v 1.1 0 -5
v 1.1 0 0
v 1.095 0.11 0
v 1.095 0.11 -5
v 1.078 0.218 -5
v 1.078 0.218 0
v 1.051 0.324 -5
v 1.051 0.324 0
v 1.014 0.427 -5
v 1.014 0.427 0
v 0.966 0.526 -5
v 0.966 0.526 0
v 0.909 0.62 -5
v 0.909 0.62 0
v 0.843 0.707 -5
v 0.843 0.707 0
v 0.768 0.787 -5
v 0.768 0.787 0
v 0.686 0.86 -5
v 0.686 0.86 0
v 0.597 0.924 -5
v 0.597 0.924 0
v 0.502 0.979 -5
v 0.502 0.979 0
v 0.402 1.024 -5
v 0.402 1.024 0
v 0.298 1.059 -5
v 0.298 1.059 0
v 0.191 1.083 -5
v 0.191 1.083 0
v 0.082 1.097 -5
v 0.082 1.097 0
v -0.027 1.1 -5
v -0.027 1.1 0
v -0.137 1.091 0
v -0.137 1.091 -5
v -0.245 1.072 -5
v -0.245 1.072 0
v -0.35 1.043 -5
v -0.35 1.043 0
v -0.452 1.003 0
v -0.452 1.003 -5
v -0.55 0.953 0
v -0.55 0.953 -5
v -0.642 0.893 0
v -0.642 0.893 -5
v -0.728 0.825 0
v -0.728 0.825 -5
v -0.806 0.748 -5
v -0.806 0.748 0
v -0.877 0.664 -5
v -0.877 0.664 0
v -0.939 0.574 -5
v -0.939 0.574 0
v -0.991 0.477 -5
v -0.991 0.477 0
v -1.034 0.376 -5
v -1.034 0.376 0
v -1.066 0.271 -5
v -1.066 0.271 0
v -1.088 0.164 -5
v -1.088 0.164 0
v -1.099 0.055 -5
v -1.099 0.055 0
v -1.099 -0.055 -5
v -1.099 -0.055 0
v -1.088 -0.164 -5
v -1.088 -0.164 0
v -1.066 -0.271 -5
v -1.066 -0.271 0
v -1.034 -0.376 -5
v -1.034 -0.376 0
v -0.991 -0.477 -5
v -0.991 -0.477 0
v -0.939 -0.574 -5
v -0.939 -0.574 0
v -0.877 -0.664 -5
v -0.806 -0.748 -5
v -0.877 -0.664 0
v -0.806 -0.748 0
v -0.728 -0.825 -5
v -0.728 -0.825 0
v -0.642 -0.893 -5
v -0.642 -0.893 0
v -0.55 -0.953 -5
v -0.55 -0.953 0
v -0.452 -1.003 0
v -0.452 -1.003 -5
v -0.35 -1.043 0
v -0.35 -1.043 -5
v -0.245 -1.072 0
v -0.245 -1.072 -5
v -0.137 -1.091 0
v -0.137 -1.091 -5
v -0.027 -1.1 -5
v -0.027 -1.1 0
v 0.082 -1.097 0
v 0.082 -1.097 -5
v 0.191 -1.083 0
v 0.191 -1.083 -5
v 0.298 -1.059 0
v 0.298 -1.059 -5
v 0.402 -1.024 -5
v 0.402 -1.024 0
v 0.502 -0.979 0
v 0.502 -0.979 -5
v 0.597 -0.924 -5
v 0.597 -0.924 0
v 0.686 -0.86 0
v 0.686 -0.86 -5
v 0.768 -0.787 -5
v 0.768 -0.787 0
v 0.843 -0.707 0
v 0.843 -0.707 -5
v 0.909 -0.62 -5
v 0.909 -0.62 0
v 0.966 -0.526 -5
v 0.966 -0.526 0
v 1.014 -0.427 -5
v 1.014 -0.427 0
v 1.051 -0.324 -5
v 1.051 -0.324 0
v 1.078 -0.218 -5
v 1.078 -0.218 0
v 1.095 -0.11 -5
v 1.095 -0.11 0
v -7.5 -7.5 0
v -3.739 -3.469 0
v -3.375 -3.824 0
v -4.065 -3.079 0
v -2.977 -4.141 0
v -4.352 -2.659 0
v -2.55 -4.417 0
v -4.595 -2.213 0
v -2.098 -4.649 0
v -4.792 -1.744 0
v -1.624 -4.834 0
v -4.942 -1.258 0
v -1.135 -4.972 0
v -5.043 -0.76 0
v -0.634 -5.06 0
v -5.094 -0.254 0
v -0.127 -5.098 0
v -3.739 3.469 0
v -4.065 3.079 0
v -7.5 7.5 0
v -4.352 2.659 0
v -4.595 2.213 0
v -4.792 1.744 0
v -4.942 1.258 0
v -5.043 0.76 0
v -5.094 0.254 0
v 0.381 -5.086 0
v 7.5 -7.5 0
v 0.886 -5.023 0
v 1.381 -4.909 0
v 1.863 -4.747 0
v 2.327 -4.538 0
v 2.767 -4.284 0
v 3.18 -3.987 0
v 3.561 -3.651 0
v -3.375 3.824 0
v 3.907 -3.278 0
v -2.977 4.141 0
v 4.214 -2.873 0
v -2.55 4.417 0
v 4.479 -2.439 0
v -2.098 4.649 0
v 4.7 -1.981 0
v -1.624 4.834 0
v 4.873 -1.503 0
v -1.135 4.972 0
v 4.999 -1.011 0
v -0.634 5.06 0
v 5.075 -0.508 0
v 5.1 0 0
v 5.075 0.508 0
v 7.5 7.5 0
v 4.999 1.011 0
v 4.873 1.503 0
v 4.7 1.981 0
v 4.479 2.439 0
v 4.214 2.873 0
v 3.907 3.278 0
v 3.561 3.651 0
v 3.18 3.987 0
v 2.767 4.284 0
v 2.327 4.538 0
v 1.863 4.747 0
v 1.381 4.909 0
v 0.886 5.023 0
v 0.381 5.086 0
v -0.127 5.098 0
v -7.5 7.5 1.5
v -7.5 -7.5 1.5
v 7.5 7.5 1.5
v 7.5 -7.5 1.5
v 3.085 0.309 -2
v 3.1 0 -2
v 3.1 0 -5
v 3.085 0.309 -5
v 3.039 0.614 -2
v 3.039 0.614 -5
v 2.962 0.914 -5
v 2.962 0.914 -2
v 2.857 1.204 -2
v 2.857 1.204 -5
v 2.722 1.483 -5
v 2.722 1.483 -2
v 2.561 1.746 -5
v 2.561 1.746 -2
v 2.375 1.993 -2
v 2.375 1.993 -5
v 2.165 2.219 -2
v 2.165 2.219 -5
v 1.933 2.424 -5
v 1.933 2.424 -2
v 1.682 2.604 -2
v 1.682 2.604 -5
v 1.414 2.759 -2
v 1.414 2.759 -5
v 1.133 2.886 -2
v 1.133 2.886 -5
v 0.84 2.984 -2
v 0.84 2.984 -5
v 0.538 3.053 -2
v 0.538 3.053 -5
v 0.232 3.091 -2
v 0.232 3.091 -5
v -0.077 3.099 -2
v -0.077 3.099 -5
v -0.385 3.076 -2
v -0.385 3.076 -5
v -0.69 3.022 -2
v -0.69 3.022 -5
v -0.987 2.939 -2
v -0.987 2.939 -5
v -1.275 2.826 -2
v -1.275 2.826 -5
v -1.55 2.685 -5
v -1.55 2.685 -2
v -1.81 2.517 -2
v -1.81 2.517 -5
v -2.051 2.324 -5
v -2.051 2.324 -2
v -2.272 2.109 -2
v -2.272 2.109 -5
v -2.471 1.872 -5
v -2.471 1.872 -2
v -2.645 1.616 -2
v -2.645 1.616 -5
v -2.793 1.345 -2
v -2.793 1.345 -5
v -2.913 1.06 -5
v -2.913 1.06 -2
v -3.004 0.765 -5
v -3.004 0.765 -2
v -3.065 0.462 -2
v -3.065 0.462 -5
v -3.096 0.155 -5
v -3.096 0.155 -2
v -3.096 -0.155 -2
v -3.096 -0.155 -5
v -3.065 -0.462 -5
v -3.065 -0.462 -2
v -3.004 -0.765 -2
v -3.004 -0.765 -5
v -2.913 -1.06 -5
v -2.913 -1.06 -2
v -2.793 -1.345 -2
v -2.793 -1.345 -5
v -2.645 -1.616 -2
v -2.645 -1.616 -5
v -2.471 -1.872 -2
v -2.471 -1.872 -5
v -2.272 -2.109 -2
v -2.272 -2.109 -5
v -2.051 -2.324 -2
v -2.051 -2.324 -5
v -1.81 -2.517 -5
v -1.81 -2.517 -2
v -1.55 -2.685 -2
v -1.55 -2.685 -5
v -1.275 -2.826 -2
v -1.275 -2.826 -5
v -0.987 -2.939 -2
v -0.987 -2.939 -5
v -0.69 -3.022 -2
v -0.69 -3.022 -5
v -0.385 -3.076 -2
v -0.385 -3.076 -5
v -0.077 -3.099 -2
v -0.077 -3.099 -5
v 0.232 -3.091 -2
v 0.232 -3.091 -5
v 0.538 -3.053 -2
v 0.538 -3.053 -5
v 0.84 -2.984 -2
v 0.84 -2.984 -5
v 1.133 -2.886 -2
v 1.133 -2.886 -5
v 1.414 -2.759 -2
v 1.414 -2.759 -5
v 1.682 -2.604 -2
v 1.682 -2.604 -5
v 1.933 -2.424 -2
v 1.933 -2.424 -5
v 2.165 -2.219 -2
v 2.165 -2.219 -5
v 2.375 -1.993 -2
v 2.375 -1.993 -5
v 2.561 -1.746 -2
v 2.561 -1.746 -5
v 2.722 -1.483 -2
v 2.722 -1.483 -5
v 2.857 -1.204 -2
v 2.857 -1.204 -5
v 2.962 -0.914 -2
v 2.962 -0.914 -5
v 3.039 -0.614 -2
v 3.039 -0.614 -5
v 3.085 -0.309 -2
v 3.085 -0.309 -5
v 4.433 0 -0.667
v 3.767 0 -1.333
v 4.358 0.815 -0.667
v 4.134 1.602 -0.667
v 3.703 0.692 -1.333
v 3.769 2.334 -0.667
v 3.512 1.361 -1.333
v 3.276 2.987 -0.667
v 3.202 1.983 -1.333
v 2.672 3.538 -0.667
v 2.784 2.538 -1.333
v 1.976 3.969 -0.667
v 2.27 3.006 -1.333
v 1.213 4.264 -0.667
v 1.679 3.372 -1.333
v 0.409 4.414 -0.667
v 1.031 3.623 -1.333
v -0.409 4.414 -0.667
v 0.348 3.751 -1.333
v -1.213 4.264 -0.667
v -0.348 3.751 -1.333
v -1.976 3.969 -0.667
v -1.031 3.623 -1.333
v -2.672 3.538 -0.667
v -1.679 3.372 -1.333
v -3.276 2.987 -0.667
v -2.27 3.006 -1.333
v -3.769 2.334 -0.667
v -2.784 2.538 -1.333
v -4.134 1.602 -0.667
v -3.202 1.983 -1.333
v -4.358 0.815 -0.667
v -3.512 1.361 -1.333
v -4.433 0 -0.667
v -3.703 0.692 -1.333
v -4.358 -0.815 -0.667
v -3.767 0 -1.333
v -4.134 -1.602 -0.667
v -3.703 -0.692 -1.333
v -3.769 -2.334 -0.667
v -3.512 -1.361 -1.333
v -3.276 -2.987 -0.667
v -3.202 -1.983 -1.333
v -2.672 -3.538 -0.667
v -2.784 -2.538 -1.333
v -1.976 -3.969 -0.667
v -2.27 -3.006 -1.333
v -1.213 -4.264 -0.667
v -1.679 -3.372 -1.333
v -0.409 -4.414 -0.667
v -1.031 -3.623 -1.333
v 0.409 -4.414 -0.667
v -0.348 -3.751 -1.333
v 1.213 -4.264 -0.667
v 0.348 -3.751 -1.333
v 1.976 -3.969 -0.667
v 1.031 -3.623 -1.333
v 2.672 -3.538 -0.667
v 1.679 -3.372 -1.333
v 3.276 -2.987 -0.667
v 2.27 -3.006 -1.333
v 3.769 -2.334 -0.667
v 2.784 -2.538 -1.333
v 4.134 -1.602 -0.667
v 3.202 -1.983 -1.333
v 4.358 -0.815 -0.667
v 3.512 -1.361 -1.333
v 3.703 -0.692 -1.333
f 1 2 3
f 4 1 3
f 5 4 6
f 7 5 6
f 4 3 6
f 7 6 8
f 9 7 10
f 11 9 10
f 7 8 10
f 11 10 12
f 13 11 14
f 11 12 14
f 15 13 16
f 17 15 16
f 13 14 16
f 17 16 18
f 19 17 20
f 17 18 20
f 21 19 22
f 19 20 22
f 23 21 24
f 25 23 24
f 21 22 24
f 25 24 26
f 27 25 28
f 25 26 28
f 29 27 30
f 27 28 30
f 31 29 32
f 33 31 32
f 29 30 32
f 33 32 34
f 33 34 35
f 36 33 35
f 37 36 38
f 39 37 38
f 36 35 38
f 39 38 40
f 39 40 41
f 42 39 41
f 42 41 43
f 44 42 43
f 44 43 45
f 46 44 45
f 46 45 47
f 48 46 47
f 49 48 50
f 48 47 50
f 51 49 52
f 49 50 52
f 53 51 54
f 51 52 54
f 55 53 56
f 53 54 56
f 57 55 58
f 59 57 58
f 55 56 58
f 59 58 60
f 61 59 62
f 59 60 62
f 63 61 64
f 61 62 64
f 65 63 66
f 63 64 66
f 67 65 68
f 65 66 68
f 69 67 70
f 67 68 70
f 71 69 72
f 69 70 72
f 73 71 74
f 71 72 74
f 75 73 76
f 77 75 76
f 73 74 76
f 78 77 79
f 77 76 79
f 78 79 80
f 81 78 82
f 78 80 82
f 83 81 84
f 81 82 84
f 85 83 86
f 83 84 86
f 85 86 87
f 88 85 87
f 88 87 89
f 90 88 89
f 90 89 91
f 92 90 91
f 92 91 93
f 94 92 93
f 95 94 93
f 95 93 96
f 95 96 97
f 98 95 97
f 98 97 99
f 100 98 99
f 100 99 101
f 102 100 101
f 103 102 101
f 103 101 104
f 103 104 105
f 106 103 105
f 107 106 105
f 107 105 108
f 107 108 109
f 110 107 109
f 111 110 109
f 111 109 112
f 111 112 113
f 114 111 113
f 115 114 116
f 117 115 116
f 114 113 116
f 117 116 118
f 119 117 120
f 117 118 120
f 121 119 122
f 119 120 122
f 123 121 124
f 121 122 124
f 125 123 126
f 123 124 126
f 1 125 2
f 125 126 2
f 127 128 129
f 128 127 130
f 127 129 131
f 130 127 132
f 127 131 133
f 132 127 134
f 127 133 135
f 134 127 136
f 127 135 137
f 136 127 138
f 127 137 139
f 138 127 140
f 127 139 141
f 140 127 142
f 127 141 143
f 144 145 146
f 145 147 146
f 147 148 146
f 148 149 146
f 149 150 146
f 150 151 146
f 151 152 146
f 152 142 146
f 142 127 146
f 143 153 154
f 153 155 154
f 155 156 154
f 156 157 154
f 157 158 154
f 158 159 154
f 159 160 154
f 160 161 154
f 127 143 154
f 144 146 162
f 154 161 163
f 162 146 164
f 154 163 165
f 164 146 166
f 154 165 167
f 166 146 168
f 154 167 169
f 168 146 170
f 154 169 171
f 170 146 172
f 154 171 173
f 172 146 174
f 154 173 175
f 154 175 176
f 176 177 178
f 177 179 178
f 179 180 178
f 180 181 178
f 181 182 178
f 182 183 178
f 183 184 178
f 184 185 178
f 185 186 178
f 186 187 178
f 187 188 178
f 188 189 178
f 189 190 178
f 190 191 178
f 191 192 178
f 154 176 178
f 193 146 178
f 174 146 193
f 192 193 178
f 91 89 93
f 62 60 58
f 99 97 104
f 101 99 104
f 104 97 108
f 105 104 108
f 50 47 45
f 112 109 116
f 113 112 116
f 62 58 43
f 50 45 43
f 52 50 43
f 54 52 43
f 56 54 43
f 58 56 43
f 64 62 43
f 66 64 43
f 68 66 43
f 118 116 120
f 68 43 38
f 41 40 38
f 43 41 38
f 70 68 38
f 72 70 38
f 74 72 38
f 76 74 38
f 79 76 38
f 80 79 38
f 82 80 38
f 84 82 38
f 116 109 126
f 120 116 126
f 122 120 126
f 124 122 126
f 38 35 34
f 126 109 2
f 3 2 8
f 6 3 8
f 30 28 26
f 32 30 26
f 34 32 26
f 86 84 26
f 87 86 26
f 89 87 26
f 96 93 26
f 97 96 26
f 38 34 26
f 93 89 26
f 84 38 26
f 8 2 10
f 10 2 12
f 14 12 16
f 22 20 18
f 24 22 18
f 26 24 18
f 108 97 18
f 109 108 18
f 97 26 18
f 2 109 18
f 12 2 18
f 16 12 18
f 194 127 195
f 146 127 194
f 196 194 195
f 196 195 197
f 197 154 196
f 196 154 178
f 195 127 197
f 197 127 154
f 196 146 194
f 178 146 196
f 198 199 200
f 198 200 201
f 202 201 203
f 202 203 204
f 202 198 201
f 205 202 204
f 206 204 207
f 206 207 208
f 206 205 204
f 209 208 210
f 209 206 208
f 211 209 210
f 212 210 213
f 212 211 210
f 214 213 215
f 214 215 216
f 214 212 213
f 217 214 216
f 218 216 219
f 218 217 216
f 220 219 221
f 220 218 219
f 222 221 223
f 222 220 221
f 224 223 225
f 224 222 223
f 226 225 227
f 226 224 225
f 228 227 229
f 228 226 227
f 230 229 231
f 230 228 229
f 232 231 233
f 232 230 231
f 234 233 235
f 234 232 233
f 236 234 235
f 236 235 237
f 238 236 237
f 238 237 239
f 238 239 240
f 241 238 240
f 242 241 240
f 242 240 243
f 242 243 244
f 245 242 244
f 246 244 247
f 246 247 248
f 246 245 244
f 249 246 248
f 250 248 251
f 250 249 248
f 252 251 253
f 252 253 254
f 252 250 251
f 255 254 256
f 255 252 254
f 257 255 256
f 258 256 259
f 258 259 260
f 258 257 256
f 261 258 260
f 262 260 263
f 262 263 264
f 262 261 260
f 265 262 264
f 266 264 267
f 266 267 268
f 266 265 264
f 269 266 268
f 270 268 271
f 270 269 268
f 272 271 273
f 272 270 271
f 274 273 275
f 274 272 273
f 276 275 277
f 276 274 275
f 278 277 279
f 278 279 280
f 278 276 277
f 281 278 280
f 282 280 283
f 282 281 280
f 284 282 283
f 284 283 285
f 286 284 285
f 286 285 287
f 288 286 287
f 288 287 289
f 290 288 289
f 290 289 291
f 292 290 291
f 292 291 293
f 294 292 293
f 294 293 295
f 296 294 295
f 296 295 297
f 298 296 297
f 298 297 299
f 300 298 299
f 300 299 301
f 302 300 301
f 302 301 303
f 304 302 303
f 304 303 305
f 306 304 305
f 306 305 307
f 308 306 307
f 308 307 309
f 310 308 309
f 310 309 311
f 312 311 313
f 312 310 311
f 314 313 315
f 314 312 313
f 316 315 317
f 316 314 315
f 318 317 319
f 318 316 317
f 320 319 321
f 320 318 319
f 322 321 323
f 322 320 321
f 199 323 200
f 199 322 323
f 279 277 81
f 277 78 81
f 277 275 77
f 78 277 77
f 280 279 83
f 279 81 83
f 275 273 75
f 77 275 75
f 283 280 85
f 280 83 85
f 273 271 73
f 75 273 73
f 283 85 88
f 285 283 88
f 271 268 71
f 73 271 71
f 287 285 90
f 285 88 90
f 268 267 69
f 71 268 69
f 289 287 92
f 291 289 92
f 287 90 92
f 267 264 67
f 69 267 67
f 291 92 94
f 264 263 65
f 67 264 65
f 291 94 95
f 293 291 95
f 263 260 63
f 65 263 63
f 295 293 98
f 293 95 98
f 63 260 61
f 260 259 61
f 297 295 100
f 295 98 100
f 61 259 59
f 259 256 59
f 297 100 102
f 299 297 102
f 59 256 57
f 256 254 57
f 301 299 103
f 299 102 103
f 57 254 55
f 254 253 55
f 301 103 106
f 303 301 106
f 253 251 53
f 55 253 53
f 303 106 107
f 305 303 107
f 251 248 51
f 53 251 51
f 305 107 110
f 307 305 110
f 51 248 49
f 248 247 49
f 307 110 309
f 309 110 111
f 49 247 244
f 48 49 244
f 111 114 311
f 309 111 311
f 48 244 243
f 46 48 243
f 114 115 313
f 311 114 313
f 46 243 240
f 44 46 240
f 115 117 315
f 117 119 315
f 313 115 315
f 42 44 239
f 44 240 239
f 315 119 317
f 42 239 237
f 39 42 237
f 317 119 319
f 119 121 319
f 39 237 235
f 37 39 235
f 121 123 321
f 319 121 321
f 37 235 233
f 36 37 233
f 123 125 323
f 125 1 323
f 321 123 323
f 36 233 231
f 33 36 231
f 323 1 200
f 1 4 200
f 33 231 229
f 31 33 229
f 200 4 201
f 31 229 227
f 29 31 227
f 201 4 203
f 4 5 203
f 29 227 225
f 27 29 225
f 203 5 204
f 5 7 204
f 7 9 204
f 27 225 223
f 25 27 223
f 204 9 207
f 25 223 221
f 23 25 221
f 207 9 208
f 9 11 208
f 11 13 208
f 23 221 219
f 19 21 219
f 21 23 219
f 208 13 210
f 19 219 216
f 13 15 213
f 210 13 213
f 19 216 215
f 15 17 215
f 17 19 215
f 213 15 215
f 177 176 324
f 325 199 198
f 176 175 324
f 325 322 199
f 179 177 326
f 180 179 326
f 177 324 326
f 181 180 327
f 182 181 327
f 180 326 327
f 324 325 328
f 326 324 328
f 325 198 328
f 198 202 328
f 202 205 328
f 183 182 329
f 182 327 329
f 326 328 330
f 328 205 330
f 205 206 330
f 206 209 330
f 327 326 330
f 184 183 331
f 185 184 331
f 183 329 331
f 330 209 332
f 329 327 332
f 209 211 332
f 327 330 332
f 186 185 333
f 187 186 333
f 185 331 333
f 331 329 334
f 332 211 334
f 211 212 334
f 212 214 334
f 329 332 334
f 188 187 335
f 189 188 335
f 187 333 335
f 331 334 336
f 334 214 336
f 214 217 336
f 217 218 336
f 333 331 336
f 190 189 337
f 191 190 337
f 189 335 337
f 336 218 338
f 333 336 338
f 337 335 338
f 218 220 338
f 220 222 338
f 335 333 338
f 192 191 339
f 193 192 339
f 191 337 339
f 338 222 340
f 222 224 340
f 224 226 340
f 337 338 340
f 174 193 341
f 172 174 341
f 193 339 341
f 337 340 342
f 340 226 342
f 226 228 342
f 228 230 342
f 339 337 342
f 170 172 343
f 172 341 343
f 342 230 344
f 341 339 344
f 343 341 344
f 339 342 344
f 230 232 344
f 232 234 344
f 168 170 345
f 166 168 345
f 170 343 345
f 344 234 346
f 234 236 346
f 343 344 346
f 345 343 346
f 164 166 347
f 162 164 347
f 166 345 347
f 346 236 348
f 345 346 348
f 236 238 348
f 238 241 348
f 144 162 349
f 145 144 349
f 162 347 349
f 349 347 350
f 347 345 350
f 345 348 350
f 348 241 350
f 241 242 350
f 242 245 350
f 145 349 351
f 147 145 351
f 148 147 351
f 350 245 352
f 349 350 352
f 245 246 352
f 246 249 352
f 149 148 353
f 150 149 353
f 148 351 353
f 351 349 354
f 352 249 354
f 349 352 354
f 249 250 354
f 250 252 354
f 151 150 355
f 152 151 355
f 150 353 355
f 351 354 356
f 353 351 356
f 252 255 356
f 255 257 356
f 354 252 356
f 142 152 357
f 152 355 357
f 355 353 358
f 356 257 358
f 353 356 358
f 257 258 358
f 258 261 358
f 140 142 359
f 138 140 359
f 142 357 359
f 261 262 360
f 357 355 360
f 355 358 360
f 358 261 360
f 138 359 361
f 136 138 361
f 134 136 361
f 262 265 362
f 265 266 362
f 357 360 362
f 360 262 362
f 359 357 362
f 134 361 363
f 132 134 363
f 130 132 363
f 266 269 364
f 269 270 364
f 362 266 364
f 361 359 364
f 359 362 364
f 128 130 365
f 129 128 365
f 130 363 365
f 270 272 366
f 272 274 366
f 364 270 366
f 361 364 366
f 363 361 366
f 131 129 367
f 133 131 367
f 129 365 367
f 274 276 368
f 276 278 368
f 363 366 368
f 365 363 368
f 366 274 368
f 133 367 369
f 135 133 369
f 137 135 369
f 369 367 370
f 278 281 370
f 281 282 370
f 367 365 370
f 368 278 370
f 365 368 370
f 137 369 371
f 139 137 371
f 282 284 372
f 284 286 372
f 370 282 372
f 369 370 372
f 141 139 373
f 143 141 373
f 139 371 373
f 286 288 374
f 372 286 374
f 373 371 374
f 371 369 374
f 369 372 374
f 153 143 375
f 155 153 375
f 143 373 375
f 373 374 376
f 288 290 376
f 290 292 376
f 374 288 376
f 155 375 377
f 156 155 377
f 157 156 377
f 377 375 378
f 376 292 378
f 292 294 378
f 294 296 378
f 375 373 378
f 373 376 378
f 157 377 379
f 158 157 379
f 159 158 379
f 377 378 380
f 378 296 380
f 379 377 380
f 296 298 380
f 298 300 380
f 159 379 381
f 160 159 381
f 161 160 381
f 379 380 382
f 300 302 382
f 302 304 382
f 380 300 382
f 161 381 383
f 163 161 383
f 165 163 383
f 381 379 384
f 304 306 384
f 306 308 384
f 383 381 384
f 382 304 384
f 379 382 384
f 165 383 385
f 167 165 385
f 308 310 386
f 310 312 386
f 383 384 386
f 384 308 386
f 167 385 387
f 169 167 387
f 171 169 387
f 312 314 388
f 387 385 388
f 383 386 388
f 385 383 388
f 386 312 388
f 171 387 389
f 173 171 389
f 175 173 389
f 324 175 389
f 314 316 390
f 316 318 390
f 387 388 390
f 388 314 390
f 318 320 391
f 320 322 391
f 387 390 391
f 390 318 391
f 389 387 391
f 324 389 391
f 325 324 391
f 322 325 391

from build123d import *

# Parameters (mm, degrees)
SKETCH_2_W        = 15
SKETCH_2_H        = 15
EXTRUDE_351_DEPTH = 1.5
SKETCH_3_R        = 3.1
SKETCH_3_R_2      = 1.1
EXTRUDE_479_DEPTH = 5
CHAMFER_1_SIZE    = 2


with BuildPart() as part:
    # Эскиз2 → Extrude 351 (new body)
    with BuildSketch(Plane.XY):
        Rectangle(SKETCH_2_W, SKETCH_2_H)
    extrude(amount=EXTRUDE_351_DEPTH)

    # Эскиз3 → Extrude 479 (add)
    with BuildSketch(Plane.XY):
        Circle(SKETCH_3_R)
        Circle(SKETCH_3_R_2, mode=Mode.SUBTRACT)
    extrude(amount=-EXTRUDE_479_DEPTH)

    # Фаска1
    chamfer_1_edges = [part.edges().sort_by_distance(p)[0] for p in [
        (-3.1, 0, 0),
    ]]
    chamfer(chamfer_1_edges, length=CHAMFER_1_SIZE)


solid = part.part
